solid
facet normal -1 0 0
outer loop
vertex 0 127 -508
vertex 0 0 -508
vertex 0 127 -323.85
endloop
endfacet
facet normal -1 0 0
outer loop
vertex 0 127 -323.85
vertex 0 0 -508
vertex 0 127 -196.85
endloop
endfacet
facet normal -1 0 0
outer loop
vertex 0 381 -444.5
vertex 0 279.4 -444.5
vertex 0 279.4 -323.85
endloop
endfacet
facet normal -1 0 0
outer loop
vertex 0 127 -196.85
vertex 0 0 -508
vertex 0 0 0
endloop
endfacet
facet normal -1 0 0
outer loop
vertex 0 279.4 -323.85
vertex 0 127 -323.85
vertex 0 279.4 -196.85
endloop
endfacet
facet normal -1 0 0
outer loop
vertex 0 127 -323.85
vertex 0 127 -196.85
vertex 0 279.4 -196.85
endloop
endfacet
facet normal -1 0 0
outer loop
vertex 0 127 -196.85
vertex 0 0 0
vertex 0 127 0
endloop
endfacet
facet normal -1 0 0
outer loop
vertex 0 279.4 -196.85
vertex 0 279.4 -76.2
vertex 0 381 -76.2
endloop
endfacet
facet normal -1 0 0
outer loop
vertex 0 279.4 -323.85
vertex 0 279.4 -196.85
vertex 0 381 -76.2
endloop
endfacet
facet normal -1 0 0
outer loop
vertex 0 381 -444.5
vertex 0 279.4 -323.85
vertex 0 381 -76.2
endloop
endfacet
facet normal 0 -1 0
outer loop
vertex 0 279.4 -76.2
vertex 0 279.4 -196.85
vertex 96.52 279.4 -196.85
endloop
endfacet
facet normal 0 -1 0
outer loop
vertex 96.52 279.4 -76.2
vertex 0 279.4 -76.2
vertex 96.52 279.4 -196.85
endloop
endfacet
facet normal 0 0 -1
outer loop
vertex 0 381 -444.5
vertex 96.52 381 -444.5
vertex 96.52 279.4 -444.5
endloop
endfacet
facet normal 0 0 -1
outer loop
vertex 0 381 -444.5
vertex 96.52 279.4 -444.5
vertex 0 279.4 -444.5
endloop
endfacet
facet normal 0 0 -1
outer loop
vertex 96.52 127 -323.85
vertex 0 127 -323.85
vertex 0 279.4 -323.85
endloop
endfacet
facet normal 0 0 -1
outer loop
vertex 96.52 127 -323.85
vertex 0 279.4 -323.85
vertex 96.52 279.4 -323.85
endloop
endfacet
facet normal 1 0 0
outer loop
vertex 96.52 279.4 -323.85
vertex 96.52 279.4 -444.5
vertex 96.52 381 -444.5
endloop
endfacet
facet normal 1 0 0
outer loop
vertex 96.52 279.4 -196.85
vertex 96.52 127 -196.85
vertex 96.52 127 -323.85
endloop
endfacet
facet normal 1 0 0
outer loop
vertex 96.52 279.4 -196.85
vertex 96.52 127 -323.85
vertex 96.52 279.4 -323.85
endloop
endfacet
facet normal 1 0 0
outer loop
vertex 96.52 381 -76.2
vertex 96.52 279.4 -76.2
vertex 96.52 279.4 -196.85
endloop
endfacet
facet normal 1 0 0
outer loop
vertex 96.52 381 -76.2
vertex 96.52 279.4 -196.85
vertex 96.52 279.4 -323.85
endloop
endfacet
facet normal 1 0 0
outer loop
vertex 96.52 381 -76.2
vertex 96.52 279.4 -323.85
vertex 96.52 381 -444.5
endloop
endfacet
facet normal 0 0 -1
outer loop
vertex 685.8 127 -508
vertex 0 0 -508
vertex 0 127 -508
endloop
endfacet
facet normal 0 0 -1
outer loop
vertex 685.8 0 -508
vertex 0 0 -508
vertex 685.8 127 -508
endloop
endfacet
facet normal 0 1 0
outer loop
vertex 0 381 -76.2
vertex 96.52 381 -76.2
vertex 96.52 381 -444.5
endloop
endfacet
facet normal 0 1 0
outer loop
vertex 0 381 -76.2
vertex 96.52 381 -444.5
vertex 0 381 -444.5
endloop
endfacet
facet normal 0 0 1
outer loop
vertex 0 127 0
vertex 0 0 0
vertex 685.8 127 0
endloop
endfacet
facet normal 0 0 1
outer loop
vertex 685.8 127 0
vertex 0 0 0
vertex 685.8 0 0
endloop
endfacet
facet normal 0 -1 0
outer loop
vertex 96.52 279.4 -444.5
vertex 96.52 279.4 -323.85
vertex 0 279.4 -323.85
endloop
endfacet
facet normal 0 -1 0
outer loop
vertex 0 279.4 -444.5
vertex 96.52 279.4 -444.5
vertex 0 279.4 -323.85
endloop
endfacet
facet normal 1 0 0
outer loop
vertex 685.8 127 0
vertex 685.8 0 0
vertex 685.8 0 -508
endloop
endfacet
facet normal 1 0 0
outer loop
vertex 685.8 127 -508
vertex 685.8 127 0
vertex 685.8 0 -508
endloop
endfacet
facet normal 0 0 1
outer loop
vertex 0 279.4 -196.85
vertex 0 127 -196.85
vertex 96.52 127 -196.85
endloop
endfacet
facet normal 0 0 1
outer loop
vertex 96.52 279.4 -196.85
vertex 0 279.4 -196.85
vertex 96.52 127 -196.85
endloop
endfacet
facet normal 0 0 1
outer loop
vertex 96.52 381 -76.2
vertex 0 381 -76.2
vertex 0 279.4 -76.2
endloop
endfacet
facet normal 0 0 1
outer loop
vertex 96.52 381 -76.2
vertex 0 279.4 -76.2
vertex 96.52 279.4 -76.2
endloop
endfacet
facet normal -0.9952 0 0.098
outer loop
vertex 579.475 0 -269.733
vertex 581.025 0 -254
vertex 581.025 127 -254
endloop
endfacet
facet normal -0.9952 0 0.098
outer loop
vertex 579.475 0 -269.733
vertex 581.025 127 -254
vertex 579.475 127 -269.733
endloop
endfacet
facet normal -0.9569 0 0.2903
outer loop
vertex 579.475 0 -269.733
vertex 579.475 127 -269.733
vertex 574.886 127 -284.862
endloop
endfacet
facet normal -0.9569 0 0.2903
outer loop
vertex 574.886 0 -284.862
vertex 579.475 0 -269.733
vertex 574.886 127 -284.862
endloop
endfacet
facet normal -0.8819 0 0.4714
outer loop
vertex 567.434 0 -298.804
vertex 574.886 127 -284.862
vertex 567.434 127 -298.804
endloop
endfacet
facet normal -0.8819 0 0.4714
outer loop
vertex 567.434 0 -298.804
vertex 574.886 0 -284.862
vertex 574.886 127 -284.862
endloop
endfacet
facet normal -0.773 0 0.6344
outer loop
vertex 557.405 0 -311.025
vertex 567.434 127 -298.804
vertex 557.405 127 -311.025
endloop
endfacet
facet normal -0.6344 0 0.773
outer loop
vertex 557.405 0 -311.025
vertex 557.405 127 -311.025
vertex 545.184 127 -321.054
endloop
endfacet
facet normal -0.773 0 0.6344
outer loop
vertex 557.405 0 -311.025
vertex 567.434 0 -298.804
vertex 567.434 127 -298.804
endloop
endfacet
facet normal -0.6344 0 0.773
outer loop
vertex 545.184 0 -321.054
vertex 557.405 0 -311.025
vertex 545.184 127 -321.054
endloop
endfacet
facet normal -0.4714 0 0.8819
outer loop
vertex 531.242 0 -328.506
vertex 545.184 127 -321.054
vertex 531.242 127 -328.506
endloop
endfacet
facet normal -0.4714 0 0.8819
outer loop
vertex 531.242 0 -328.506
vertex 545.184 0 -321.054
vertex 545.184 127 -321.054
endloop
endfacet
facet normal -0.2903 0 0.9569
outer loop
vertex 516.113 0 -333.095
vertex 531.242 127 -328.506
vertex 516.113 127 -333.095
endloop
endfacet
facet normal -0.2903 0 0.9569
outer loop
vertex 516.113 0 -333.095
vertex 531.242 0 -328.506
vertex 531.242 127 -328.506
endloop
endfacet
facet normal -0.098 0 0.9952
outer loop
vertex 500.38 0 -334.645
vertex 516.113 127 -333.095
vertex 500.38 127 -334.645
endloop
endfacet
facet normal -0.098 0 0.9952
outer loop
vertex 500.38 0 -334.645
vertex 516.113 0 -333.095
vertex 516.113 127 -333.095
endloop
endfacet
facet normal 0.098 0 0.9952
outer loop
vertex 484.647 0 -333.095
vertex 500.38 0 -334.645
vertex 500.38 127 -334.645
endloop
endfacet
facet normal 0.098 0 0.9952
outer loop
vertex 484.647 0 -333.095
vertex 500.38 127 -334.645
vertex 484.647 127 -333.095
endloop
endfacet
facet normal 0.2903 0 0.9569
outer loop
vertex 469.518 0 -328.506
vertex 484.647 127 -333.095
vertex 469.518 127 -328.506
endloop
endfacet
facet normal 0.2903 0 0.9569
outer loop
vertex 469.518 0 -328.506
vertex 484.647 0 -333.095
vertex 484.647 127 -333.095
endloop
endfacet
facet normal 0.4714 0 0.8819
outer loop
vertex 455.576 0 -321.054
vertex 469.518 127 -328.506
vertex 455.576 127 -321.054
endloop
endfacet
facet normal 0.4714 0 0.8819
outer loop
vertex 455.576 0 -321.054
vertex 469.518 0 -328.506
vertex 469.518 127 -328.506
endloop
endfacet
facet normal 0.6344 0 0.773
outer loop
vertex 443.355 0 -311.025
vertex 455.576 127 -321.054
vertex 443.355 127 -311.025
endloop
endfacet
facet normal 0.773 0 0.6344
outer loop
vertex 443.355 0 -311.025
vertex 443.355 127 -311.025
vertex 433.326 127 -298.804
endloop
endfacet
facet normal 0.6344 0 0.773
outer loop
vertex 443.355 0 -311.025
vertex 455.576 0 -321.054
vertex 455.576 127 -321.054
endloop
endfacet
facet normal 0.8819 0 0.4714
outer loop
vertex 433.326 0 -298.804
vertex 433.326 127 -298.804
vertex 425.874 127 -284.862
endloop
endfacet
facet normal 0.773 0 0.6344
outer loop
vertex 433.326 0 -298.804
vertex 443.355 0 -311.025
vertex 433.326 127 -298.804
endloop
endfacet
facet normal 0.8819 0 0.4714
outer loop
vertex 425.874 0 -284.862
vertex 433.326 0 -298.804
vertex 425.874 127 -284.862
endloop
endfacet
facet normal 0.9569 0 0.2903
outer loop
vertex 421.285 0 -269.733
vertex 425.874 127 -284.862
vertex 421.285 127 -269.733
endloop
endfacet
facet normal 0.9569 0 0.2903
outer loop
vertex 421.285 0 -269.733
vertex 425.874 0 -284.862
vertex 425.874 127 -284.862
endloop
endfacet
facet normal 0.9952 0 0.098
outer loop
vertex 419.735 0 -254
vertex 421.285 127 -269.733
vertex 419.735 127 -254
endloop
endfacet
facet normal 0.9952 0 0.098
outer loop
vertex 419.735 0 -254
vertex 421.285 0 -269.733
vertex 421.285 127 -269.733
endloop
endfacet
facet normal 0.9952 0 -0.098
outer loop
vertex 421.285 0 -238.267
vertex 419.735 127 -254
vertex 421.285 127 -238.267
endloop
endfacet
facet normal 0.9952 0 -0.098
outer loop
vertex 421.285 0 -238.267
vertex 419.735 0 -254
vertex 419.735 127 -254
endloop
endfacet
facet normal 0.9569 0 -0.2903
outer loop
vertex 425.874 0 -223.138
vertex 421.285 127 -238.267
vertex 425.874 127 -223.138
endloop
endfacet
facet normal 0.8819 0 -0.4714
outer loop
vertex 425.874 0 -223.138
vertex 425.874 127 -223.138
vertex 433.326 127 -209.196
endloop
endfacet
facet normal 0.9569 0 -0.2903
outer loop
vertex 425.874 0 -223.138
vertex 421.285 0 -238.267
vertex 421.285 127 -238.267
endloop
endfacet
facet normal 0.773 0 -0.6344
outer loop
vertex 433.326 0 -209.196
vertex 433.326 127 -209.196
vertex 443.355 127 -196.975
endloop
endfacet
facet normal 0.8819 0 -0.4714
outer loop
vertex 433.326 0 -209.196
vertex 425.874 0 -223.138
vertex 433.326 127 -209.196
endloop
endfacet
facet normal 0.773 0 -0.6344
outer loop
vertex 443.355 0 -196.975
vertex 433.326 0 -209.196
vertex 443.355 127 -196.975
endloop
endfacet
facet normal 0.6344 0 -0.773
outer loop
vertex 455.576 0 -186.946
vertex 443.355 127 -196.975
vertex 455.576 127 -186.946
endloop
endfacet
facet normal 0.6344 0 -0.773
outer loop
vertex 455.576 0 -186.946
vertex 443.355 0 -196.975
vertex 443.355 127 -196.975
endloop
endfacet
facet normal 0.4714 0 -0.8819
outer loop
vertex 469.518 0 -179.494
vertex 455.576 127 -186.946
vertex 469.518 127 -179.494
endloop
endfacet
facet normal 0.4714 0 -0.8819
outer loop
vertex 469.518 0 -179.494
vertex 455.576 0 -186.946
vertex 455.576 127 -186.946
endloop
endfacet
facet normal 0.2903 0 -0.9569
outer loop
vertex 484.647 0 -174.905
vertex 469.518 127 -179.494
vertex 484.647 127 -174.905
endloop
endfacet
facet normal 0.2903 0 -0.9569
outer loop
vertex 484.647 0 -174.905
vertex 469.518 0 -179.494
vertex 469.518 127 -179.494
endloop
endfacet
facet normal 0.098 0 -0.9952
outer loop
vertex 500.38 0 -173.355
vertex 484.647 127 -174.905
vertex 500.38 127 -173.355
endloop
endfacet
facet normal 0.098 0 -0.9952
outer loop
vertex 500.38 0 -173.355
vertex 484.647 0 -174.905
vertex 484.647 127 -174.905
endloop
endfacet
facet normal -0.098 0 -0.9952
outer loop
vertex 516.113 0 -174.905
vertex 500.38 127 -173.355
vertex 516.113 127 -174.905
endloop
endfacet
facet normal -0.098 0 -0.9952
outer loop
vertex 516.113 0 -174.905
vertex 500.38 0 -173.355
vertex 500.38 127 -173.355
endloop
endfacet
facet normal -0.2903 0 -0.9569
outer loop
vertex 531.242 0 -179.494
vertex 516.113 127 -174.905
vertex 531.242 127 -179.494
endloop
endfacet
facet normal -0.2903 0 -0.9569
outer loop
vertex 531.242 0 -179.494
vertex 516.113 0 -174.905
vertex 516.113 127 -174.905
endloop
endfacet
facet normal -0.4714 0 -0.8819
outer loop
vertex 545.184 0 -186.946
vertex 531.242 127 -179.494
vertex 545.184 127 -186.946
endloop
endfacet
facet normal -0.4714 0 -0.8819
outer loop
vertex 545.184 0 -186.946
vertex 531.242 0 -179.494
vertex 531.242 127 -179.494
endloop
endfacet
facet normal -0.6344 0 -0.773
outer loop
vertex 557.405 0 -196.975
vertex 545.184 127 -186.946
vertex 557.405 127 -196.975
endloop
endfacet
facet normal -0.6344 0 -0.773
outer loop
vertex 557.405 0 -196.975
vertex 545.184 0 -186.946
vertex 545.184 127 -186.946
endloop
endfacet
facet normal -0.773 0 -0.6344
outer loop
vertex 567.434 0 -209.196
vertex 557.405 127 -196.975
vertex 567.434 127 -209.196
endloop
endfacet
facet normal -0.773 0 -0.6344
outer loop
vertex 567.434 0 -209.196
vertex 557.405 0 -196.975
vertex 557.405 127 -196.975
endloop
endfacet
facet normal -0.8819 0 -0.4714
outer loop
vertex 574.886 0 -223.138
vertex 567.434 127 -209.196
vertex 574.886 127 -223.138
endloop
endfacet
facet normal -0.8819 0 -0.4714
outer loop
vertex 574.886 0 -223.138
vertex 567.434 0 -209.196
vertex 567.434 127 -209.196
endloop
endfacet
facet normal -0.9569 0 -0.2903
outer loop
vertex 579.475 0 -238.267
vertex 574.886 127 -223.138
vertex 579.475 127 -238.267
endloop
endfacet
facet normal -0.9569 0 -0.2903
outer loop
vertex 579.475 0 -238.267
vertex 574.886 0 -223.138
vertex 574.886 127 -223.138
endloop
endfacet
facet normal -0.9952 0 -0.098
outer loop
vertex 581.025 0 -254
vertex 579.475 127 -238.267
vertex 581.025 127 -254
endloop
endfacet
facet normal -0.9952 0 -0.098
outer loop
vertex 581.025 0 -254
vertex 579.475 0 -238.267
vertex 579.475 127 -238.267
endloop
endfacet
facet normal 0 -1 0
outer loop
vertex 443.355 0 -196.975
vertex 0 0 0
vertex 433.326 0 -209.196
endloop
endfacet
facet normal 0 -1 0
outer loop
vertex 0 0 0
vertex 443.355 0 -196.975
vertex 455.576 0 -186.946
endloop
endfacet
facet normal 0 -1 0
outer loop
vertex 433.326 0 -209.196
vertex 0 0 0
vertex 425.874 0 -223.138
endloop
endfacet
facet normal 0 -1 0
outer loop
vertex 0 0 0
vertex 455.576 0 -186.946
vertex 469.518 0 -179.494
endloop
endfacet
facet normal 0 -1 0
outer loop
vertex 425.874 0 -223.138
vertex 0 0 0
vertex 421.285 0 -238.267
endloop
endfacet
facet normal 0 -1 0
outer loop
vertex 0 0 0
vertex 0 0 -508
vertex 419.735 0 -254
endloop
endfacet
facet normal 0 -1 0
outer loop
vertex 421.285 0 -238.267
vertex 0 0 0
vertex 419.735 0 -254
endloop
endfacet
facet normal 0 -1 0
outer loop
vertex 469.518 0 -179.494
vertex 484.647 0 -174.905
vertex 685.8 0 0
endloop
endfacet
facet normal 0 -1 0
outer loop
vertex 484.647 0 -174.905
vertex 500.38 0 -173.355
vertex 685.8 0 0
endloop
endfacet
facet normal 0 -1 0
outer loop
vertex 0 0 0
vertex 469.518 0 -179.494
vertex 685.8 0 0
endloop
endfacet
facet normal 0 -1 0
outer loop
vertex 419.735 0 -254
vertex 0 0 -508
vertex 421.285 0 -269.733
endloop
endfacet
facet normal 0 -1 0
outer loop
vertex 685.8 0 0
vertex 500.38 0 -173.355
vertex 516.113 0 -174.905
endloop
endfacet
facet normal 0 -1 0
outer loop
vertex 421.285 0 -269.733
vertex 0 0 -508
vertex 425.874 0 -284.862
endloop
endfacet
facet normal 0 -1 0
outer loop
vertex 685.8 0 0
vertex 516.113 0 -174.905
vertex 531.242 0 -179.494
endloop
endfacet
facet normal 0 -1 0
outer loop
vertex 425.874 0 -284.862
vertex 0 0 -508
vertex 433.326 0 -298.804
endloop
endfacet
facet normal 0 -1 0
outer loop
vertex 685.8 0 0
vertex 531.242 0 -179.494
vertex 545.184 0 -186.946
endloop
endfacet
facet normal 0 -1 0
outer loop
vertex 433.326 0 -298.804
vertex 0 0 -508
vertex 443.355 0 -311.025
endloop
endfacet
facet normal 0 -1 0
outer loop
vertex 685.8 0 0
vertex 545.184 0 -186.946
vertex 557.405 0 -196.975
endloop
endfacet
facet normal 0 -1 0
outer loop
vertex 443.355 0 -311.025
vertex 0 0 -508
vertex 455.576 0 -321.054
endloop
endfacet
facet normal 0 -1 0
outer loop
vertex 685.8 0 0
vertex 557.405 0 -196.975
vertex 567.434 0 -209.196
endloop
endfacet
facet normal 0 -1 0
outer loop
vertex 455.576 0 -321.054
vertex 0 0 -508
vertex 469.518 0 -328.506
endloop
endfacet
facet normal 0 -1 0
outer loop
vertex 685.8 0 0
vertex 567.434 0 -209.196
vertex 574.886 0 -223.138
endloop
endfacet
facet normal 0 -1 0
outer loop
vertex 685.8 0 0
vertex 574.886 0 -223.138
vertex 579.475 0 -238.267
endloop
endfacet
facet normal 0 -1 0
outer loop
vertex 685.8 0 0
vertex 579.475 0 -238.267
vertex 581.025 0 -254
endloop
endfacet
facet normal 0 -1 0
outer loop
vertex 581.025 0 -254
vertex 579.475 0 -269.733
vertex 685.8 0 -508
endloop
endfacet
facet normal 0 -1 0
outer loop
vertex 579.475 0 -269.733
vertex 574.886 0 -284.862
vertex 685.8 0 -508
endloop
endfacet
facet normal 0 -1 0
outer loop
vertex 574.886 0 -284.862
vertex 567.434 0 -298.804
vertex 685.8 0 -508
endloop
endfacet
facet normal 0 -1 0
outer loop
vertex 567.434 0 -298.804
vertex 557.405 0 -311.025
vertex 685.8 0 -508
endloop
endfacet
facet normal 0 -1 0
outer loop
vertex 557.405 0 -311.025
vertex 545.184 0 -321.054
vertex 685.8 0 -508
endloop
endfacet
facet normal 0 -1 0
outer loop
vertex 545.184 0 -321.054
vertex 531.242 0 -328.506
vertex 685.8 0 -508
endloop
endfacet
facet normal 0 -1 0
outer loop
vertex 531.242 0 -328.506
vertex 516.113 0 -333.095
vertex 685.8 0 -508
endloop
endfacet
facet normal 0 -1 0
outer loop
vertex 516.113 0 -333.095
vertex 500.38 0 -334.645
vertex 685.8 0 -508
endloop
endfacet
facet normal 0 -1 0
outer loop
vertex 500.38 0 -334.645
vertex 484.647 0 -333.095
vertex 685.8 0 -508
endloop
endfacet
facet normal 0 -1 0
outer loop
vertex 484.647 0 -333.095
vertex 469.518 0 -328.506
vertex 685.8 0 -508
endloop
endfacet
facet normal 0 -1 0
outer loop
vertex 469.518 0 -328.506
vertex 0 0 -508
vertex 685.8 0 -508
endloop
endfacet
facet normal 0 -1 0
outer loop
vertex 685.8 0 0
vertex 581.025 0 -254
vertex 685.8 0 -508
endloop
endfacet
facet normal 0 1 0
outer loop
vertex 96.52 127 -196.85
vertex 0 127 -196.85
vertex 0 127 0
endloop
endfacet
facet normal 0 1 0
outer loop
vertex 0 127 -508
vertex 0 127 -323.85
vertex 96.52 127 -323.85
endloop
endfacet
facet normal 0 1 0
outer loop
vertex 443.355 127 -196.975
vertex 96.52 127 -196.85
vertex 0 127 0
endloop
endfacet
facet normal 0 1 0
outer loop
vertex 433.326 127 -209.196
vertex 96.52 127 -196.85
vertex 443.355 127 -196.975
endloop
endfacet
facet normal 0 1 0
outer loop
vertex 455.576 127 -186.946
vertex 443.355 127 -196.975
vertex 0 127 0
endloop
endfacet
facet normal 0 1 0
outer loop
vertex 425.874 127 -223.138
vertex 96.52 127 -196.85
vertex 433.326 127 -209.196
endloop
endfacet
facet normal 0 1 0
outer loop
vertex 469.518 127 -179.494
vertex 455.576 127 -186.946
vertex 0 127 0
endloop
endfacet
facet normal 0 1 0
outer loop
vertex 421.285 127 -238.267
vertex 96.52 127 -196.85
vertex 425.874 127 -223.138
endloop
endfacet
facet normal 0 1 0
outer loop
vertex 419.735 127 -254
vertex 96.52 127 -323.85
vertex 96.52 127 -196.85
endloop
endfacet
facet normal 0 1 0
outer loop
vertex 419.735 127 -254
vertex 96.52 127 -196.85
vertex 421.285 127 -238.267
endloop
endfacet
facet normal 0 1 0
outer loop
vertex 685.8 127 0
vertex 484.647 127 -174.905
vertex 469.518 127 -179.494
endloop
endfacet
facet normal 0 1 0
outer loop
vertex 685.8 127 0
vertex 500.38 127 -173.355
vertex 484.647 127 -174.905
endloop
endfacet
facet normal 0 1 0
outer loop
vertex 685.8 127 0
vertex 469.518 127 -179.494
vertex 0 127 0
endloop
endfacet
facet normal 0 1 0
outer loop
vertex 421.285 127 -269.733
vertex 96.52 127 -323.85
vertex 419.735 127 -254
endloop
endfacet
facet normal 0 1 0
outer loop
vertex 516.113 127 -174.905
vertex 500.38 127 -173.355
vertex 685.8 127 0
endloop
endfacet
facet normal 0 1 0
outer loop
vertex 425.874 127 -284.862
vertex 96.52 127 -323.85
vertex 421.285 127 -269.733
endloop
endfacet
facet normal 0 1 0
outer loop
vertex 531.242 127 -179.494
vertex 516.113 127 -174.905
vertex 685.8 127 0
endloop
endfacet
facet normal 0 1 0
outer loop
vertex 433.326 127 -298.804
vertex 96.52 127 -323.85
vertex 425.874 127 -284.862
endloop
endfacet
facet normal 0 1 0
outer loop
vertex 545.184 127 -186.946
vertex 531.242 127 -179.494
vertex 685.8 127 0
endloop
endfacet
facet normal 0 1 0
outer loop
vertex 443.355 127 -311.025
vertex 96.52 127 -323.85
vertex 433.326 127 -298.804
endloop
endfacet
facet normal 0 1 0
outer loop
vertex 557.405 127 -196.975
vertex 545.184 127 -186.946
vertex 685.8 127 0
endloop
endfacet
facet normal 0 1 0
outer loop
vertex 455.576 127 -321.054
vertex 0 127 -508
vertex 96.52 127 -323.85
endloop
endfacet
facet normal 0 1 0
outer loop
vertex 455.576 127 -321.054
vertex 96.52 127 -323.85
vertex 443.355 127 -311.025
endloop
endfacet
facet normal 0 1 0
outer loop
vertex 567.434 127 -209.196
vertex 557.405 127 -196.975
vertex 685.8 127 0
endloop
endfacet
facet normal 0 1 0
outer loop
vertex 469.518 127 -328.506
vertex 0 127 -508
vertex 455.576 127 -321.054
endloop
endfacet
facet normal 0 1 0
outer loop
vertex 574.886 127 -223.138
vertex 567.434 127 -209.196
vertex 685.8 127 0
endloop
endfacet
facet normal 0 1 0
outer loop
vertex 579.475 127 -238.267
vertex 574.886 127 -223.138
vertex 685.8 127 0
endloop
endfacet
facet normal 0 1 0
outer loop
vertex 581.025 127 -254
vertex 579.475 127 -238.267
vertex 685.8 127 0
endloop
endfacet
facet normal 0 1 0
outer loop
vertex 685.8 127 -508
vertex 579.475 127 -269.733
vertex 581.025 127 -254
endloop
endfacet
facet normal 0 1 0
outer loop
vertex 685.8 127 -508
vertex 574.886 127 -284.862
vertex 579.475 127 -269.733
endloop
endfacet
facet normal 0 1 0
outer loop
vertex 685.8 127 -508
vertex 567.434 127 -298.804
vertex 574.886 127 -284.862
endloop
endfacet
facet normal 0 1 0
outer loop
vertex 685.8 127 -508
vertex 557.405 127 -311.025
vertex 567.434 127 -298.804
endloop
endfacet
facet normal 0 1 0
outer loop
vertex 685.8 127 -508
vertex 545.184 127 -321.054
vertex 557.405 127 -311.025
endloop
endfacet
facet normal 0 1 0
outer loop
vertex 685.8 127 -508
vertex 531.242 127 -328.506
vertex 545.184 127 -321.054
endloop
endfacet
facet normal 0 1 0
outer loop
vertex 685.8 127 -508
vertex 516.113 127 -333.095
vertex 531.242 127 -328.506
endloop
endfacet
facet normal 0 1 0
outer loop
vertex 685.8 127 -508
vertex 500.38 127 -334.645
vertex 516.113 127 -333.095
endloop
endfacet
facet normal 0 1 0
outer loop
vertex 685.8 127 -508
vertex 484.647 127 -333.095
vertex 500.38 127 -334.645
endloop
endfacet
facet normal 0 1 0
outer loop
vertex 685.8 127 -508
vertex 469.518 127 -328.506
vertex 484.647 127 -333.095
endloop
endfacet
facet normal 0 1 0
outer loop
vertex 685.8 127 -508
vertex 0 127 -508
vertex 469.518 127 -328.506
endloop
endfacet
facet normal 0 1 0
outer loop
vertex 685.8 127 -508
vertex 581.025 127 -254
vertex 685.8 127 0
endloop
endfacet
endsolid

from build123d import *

# Parameters (mm, degrees)
SKETCH1_W           = 685.8
SKETCH1_H           = 508
BOSS_EXTRUDE1_DEPTH = 127
SKETCH2_W           = 96.52
SKETCH2_H           = 127
BOSS_EXTRUDE2_DEPTH = 254
SKETCH3_W           = 96.52
SKETCH3_H           = 101.6
BOSS_EXTRUDE3_DEPTH = 120.65
SKETCH4_W           = 96.52
SKETCH4_H           = 101.6
BOSS_EXTRUDE4_DEPTH = 120.65
HOLE4_OUTLINE_R     = 80.645
HOLE4_DEPTH         = 127


# Read off the part's stored shape, not the designer's step: Hole4
with BuildPart() as part:
    # Sketch1 → Boss-Extrude1 (new body)
    with BuildSketch(Plane(origin=(0, 0, 0), x_dir=(1, 0, 0), z_dir=(0, 1, 0))):
        with Locations((342.9, 254)):
            Rectangle(SKETCH1_W, SKETCH1_H)
    extrude(amount=BOSS_EXTRUDE1_DEPTH)

    # Sketch2 → Boss-Extrude2 (add)
    with BuildSketch(Plane(origin=(0, 127, 0), x_dir=(1, 0, 0), z_dir=(0, 1, 0))):
        with Locations((48.26, 260.35)):
            Rectangle(SKETCH2_W, SKETCH2_H)
    extrude(amount=BOSS_EXTRUDE2_DEPTH)

    # Sketch3 → Boss-Extrude3 (add)
    with BuildSketch(Plane.XY.offset(-196.85)):
        with Locations((48.26, 330.2)):
            Rectangle(SKETCH3_W, SKETCH3_H)
    extrude(amount=BOSS_EXTRUDE3_DEPTH)

    # Sketch4 → Boss-Extrude4 (add)
    with BuildSketch(Plane(origin=(0, 0, -323.85), x_dir=(-1, 0, 0), z_dir=(0, 0, -1))):
        with Locations((-48.26, 330.2)):
            Rectangle(SKETCH4_W, SKETCH4_H)
    extrude(amount=BOSS_EXTRUDE4_DEPTH)

    # Hole4 outline → Hole4 (cut)
    with BuildSketch(Plane(origin=(0, 0, 0), x_dir=(1, 0, 0), z_dir=(0, 1, 0))):
        with Locations((500.38, 254)):
            Circle(HOLE4_OUTLINE_R)
    extrude(amount=HOLE4_DEPTH, mode=Mode.SUBTRACT)


solid = part.part
